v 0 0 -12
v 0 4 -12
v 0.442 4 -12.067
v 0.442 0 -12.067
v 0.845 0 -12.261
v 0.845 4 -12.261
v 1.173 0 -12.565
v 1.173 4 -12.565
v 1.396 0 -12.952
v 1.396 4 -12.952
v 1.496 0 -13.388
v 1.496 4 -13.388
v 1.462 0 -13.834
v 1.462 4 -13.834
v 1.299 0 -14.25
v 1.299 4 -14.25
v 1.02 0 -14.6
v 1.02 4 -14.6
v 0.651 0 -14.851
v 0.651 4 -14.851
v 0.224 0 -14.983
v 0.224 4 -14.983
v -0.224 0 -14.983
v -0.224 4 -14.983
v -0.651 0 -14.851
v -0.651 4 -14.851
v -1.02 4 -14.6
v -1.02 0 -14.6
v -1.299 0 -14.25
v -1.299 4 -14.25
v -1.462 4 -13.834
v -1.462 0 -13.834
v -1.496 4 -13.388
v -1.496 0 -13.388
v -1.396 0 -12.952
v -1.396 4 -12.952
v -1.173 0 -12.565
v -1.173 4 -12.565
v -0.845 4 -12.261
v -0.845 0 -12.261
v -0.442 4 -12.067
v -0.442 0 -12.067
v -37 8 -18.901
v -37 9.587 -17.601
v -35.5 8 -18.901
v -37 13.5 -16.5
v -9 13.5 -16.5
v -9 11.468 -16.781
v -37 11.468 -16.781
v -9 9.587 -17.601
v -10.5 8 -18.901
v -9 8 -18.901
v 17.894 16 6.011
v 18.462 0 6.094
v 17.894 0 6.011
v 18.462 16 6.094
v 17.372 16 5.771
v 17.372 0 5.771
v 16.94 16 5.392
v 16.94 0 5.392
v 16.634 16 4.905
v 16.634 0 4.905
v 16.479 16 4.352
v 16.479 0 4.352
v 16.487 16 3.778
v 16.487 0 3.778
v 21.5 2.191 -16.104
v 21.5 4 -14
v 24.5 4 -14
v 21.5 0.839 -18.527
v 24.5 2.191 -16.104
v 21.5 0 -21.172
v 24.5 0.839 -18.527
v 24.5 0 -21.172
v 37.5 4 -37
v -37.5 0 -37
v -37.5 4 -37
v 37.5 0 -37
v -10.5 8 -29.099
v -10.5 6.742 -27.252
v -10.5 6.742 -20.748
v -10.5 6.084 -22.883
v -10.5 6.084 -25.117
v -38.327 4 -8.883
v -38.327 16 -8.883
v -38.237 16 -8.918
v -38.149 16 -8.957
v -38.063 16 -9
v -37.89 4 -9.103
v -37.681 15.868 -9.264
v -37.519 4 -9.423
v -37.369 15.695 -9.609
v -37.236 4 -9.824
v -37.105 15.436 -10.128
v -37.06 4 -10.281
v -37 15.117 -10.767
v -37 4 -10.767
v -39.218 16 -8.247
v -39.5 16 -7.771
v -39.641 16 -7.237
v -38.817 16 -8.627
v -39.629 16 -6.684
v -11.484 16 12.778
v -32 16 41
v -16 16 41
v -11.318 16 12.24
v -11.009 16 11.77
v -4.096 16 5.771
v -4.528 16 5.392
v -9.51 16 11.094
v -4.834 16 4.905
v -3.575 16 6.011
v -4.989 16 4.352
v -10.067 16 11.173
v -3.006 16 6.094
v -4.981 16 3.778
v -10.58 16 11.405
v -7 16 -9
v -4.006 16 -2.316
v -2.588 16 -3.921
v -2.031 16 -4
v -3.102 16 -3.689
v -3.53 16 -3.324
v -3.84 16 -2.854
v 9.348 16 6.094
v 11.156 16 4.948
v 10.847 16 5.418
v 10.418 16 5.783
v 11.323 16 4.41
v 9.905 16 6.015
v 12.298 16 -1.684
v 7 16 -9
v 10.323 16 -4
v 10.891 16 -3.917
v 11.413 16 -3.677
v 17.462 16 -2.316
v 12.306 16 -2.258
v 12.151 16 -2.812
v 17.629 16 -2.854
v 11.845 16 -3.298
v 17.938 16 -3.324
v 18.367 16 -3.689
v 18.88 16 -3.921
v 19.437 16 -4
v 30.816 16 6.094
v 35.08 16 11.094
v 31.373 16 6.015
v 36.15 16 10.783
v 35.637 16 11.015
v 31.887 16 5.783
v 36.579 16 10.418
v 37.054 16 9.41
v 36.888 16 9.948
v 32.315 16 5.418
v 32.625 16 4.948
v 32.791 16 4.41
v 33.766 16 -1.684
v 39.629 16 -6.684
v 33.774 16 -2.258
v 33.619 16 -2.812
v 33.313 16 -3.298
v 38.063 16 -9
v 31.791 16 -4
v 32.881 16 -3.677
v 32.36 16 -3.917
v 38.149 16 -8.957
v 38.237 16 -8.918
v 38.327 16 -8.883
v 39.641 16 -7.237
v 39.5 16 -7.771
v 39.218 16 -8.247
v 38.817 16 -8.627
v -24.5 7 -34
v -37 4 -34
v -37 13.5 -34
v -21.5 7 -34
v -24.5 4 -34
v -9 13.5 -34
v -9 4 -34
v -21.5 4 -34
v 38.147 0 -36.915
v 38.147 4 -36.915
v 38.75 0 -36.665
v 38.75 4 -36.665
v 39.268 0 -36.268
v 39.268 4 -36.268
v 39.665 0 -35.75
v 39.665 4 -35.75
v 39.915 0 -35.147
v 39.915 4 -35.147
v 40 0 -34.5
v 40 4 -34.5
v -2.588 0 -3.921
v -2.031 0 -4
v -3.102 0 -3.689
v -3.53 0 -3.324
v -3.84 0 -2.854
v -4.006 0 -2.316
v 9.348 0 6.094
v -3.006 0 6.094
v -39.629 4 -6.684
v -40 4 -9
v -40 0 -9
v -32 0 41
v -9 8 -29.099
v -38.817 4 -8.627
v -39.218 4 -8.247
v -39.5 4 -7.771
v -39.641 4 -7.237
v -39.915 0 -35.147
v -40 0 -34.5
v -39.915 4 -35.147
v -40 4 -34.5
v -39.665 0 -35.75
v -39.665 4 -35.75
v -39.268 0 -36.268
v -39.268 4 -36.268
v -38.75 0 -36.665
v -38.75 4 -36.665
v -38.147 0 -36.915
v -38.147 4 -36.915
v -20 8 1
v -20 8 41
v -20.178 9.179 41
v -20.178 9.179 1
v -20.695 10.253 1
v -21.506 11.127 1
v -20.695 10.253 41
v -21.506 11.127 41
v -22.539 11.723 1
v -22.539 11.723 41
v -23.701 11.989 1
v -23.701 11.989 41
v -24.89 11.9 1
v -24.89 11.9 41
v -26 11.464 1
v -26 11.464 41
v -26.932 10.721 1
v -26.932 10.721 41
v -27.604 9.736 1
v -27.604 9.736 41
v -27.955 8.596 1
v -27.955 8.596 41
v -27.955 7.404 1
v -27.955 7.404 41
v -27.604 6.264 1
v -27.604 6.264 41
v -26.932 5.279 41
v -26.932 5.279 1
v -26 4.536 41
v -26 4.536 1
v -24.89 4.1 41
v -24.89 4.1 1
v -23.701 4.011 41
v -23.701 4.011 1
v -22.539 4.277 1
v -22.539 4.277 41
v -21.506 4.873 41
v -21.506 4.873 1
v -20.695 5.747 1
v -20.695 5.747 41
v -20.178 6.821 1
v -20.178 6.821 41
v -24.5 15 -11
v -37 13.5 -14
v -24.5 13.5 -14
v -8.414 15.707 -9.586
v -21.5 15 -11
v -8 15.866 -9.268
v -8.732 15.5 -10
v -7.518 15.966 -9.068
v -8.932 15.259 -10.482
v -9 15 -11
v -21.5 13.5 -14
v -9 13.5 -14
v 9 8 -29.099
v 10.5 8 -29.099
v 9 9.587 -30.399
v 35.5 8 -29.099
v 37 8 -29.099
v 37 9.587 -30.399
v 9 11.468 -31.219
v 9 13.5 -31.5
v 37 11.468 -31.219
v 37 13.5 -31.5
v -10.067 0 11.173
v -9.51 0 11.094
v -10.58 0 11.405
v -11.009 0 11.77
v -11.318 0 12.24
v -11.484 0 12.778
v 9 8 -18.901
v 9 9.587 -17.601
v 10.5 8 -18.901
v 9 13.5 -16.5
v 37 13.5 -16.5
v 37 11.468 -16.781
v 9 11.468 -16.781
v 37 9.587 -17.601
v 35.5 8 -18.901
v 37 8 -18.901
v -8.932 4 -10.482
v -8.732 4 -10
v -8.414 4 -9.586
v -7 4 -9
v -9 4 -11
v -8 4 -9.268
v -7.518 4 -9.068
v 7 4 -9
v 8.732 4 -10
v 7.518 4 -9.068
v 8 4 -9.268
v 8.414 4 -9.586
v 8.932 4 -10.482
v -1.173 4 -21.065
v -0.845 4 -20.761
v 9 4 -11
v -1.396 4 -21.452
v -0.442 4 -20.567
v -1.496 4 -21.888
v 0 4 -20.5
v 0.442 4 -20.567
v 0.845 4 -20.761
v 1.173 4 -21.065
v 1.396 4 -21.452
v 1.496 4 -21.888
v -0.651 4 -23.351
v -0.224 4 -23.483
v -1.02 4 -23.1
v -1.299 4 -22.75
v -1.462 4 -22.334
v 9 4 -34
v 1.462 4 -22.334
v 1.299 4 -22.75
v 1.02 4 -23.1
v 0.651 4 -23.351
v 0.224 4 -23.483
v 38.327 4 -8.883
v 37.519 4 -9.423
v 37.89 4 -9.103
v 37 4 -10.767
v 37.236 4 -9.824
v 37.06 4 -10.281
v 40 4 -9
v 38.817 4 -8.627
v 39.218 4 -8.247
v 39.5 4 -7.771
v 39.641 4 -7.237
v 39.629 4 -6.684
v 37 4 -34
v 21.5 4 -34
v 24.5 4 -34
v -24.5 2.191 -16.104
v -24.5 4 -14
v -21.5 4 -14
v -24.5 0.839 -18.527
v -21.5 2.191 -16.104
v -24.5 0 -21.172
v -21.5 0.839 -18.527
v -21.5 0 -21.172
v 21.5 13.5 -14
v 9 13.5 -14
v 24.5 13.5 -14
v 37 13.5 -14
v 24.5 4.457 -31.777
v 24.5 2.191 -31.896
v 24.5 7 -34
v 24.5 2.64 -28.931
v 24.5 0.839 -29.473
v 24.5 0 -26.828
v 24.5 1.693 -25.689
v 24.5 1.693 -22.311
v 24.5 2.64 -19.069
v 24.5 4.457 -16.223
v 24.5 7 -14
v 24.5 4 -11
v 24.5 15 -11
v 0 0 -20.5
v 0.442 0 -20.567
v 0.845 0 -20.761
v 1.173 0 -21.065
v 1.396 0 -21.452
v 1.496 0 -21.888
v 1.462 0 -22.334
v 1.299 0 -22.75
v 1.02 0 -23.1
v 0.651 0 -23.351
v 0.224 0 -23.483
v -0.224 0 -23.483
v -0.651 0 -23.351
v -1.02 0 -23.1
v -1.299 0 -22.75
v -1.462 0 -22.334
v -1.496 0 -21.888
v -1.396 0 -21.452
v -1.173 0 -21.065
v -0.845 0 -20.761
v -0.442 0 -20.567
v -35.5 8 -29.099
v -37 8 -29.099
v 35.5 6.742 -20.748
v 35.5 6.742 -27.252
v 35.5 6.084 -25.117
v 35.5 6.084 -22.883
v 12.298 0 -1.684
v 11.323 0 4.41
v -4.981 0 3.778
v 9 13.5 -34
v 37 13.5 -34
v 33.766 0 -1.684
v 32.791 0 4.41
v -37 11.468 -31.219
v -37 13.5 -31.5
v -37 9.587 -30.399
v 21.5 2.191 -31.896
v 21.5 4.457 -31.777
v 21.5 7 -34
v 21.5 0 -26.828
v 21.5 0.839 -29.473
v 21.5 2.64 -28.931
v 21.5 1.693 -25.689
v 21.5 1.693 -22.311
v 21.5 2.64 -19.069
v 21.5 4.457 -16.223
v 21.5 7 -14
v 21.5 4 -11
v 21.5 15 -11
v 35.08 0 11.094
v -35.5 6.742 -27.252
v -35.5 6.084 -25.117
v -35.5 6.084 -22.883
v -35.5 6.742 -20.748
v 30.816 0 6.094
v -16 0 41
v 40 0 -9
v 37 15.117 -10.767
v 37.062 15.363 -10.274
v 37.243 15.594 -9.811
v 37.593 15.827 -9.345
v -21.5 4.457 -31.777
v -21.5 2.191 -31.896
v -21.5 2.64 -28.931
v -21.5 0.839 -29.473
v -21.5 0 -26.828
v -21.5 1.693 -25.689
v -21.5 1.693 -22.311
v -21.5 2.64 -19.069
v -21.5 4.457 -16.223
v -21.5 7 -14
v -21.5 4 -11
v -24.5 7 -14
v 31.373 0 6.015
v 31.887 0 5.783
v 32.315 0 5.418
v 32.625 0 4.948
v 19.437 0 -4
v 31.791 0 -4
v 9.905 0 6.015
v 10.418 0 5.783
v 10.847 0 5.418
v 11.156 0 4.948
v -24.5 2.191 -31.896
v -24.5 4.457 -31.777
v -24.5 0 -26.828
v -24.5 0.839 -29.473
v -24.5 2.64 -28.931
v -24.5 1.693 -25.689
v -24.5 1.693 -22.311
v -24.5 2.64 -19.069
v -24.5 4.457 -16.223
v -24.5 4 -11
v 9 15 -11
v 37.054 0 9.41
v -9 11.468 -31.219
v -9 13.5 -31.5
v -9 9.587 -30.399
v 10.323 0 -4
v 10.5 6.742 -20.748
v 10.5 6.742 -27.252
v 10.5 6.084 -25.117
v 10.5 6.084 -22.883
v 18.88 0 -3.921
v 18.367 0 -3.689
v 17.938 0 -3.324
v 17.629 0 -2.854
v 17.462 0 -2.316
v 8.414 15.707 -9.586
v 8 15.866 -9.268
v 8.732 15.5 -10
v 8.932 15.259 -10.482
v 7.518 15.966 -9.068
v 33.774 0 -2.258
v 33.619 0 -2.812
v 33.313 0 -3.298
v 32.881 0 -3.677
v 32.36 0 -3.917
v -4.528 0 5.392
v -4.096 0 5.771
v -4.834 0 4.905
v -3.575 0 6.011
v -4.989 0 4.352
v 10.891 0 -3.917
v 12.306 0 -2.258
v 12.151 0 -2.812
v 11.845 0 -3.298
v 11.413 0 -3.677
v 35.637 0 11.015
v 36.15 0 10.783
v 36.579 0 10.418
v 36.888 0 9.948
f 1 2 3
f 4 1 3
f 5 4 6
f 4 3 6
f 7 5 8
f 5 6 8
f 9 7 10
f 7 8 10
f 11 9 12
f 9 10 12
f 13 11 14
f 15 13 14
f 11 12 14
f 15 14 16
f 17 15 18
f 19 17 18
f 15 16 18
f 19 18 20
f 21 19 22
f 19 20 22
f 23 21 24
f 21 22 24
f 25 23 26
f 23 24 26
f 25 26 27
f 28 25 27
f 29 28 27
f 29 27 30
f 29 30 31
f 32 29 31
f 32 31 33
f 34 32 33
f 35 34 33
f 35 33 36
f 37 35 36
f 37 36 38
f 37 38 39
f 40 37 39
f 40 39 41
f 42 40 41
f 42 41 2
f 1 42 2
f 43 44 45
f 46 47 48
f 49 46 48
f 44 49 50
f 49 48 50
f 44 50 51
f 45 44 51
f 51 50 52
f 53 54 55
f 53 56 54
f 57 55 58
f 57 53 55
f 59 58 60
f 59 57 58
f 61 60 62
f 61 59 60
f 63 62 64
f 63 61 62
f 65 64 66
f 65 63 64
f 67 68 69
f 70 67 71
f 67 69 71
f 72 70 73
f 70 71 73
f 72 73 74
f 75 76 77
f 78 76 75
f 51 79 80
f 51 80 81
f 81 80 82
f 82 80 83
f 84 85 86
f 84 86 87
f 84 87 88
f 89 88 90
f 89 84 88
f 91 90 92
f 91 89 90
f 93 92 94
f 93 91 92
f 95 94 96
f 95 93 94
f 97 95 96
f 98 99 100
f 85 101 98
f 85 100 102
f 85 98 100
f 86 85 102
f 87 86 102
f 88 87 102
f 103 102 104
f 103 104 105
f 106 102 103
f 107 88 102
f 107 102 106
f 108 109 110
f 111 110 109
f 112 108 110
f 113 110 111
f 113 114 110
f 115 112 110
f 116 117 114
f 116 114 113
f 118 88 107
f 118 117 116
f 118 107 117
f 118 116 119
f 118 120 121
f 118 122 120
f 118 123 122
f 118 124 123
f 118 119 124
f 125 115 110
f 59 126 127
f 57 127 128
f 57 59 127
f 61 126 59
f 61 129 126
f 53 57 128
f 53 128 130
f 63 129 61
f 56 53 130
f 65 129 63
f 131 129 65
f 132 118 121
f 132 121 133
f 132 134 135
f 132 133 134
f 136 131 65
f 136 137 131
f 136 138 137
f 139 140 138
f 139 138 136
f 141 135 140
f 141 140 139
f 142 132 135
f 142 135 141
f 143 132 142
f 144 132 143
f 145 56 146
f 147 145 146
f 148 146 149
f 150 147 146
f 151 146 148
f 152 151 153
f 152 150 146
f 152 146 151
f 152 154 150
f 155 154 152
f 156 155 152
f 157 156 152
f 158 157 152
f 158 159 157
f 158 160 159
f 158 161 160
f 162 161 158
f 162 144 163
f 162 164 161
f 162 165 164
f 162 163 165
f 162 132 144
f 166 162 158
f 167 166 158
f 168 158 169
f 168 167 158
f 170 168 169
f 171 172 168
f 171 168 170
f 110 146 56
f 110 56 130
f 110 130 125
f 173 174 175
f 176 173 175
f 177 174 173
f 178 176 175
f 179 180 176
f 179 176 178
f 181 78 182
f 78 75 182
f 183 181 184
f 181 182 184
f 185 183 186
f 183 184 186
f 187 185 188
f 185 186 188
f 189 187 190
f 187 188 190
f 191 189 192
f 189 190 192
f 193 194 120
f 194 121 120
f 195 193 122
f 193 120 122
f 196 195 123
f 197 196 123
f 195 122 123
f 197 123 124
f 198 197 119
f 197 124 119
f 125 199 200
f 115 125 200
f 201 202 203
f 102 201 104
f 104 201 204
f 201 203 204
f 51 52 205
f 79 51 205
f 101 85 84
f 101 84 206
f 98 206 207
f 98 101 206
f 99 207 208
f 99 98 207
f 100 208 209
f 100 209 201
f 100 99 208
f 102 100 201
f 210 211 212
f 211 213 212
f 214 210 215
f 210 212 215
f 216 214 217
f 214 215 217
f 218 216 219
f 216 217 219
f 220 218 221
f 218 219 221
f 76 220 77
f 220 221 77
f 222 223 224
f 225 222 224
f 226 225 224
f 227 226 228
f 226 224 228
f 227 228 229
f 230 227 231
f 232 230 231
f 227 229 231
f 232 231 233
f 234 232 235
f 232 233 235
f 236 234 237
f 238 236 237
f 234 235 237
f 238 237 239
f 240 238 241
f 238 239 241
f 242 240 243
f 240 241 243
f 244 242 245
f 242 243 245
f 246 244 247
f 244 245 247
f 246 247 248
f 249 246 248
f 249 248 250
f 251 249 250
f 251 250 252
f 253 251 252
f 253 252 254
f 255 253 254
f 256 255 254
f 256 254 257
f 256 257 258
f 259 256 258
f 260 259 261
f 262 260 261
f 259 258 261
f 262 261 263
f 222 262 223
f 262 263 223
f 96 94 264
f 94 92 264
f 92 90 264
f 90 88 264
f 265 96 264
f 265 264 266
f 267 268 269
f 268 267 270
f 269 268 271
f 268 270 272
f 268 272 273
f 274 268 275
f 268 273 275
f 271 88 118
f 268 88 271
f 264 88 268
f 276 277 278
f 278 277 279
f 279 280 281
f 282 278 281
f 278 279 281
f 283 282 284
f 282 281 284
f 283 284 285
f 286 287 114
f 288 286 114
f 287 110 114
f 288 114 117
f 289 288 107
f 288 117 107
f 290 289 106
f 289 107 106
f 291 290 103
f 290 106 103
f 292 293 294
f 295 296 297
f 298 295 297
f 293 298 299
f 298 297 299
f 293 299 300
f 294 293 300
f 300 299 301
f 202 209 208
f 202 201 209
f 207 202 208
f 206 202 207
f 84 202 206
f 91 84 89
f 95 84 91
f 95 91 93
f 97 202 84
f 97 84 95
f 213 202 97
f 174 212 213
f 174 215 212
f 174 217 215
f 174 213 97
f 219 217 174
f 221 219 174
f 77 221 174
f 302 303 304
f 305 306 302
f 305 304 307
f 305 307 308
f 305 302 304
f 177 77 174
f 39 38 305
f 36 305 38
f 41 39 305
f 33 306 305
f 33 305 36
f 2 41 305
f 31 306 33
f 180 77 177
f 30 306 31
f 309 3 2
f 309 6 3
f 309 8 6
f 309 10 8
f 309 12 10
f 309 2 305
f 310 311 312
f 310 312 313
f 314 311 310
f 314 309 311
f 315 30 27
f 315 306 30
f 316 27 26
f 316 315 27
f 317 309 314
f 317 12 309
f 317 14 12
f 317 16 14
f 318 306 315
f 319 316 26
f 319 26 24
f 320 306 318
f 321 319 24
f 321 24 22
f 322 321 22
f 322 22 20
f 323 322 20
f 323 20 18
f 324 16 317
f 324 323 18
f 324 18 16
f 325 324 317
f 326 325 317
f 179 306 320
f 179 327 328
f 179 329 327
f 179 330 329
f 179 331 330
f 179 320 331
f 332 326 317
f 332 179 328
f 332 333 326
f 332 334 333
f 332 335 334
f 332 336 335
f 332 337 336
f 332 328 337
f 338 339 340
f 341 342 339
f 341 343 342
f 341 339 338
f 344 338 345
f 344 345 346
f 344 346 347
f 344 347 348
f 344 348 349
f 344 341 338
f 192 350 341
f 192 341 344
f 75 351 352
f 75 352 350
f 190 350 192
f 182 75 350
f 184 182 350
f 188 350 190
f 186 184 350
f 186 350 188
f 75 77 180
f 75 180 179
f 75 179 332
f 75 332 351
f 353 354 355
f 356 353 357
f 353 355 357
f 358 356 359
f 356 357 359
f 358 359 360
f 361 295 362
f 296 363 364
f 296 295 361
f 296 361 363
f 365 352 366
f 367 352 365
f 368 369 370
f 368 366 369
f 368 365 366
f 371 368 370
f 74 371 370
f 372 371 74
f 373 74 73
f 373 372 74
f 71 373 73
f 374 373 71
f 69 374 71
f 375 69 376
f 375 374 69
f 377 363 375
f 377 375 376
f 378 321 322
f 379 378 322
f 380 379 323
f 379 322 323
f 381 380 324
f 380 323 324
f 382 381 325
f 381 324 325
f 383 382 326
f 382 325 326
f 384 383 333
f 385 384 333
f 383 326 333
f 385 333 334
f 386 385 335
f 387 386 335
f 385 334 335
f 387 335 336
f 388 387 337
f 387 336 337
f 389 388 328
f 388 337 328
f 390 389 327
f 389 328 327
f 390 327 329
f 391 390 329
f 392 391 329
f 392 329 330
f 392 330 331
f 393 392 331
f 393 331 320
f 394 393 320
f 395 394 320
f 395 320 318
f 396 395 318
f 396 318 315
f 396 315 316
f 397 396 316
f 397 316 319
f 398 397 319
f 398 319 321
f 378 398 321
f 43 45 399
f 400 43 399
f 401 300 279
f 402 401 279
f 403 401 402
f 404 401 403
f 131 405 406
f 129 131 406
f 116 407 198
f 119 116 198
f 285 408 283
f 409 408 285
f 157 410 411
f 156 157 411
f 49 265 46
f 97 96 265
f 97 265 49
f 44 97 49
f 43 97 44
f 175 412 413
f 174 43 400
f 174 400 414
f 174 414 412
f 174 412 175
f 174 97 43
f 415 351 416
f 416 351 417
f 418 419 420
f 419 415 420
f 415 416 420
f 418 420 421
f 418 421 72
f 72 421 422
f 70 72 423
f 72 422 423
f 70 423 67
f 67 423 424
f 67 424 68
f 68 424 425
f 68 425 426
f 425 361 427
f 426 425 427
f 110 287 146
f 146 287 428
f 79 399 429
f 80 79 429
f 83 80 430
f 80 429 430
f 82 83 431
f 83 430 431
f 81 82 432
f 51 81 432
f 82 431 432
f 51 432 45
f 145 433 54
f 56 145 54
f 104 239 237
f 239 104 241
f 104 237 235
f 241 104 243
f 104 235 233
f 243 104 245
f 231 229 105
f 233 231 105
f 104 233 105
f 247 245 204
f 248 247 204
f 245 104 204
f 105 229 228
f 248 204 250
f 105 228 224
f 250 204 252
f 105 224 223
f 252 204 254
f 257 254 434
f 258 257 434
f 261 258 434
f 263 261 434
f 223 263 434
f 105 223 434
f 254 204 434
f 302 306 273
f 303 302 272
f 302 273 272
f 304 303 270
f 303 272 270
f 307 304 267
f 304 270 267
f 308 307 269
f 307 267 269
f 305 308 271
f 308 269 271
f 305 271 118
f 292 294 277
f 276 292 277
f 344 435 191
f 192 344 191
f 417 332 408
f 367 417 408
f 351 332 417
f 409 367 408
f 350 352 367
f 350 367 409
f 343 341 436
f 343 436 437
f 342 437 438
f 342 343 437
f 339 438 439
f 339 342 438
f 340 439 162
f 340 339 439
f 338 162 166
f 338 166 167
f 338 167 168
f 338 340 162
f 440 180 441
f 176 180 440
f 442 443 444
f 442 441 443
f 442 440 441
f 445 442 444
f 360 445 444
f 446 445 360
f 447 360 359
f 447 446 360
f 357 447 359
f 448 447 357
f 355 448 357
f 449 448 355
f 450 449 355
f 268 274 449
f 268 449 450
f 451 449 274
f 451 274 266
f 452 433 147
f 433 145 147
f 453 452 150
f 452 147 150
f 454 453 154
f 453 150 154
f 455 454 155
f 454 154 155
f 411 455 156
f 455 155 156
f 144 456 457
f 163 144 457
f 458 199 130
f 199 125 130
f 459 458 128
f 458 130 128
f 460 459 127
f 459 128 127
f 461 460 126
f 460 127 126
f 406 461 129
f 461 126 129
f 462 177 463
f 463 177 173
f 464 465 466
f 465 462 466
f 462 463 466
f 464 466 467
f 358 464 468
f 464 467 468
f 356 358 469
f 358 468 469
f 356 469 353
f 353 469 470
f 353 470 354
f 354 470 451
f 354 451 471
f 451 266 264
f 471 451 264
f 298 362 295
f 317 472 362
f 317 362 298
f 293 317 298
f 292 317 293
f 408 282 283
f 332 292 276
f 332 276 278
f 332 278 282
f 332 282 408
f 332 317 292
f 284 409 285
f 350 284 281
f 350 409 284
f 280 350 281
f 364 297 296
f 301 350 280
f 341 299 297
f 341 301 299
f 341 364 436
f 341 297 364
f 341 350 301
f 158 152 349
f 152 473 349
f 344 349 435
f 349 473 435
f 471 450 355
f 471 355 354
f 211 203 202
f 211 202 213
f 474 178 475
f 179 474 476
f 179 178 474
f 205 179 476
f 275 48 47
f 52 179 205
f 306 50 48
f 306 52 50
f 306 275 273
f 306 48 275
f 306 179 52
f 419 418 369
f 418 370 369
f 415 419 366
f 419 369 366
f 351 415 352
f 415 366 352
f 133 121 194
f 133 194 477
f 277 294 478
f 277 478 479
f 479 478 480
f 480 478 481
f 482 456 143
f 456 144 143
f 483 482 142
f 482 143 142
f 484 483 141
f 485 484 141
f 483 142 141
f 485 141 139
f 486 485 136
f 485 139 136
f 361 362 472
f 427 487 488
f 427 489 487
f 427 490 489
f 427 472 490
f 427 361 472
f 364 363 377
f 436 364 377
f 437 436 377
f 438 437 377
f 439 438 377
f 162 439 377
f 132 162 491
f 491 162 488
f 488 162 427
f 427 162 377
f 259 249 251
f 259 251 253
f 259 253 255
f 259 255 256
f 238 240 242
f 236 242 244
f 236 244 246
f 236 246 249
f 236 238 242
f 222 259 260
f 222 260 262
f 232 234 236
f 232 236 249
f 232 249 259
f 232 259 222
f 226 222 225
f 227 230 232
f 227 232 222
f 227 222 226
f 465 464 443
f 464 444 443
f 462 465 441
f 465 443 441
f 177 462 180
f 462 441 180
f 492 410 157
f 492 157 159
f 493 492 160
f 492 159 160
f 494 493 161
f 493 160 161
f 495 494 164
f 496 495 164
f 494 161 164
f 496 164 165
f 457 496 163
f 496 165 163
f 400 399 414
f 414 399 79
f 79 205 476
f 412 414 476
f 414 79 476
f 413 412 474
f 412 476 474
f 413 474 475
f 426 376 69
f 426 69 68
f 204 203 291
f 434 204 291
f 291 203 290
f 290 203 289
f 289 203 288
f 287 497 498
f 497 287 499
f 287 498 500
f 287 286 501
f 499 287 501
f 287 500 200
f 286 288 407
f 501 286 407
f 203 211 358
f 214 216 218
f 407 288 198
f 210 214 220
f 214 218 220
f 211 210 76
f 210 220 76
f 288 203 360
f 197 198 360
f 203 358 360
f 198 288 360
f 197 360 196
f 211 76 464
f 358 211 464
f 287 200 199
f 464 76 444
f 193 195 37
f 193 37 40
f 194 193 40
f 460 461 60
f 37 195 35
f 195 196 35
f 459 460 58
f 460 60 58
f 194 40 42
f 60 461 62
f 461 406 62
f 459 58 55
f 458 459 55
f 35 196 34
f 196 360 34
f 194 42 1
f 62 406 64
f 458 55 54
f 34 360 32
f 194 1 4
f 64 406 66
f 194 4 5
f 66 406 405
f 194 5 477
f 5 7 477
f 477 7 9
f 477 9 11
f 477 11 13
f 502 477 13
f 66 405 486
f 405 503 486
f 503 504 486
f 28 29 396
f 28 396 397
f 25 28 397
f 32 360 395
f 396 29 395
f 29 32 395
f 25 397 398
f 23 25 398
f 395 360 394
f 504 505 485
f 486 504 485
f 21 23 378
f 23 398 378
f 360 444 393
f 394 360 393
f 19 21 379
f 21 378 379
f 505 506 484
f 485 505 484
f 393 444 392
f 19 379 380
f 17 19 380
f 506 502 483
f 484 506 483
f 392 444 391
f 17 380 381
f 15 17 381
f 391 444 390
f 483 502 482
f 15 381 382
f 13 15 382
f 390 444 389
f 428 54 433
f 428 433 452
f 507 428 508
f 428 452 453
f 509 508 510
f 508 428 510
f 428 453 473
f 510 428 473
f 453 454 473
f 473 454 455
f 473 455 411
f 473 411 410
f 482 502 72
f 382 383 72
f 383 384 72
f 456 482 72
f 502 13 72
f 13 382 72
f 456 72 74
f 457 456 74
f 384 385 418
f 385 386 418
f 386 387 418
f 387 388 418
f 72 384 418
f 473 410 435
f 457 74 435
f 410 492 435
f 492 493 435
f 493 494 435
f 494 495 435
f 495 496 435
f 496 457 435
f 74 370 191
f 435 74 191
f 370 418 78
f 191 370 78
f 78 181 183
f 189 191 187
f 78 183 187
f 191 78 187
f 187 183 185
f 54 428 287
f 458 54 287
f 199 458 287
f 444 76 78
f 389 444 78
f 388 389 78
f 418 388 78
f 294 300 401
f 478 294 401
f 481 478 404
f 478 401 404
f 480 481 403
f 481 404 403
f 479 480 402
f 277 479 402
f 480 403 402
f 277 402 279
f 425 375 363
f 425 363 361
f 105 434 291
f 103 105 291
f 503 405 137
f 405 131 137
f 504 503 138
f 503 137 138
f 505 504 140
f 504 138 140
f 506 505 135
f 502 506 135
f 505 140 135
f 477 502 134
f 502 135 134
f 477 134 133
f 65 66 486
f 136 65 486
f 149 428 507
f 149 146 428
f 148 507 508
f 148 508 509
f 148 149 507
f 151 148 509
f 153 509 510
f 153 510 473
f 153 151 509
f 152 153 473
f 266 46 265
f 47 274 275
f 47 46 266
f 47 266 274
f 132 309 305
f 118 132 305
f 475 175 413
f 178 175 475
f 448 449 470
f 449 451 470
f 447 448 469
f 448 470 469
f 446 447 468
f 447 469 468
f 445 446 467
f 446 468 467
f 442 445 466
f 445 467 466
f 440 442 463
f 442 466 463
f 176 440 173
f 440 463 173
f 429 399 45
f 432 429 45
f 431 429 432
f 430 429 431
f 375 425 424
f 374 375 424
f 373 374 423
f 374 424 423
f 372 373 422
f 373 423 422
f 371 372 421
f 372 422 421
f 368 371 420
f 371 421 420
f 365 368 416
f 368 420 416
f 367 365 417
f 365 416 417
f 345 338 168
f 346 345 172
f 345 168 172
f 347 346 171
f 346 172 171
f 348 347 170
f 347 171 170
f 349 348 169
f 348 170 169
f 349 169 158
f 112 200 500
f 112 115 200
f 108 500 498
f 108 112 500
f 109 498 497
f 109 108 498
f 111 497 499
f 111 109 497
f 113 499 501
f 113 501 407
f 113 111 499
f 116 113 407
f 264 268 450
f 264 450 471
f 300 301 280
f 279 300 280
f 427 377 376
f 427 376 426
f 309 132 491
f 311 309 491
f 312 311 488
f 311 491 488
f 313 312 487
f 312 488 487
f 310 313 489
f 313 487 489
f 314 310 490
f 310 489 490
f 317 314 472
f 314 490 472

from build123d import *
from build123d.topology import SkipClean

# Parameters (mm, degrees)
SKETCH7_W       = 80
SKETCH7_H       = 28
EXTRUDE2_DEPTH  = 4
SKETCH8_W       = 28
SKETCH8_H       = 20
EXTRUDE3_DEPTH  = 9.5
EXTRUDE6_DEPTH  = 28
SKETCH15_R      = 7.5
EXTRUDE7_DEPTH  = 25
SKETCH16_W      = 3
SKETCH16_H      = 3
SKETCH8_4_W     = 28
SKETCH8_4_H     = 20
EXTRUDE8_DEPTH  = 9.5
EXTRUDE9_DEPTH  = 28
SKETCH19_R      = 7.5
EXTRUDE10_DEPTH = 25
SKETCH20_W      = 3
SKETCH20_H      = 3
FILLET1_R       = 2.5
EXTRUDE11_DEPTH = 16
SKETCH25_W      = 28
SKETCH25_H      = 5
EXTRUDE13_DEPTH = 12
EXTRUDE14_REACH = 90.69
FILLET11_R      = 2
SKETCH27_W      = 28
SKETCH27_H      = 5
EXTRUDE15_DEPTH = 12
EXTRUDE16_REACH = 90.69
FILLET14_R      = 2
SKETCH30_W      = 3
SKETCH30_H      = 3
EXTRUDE17_DEPTH = 12
SKETCH31_W      = 3
SKETCH31_H      = 3
EXTRUDE18_DEPTH = 12
SKETCH32_R      = 4
EXTRUDE19_DEPTH = 40
FILLET15_R      = 2
FILLET16_R      = 2
FILLET17_R      = 2
FILLET18_R      = 2
FILLET19_R      = 2
FILLET20_R      = 2
FILLET21_R      = 2
SKETCH33_R      = 1.5
EXTRUDE20_DEPTH = 59.523499692


with BuildPart() as part:
    # Sketch7 → Extrude2 (new body)
    with BuildSketch(Plane(origin=(0, 0, 0), x_dir=(1, 0, 0), z_dir=(0, 1, 0))):
        with Locations((0, 23)):
            Rectangle(SKETCH7_W, SKETCH7_H)
    extrude(amount=EXTRUDE2_DEPTH)


with BuildPart() as body_2:
    # Sketch8 → Extrude3 (new body)
    with BuildSketch(Plane(origin=(0, 4, 0), x_dir=(1, 0, 0), z_dir=(0, 1, 0))):
        with Locations((-23, 24)):
            Rectangle(SKETCH8_W, SKETCH8_H)
    extrude(amount=EXTRUDE3_DEPTH)

    # Sketch10 → Extrude6 (cut)
    with BuildSketch(Plane(origin=(-9, 0, 0), x_dir=(0, 0, -1), z_dir=(1, 0, 0))):
        with BuildLine():
            Line((31.5, 13.5), (24, 13.5))
            Line((24, 13.5), (16.5, 13.5))
            ThreePointArc((16.5, 13.5), (17.126403912, 10.499387259), (18.900980486, 8))
            Line((18.900980486, 8), (29.099019514, 8))
            ThreePointArc((29.099019514, 8), (30.873596088, 10.499387259), (31.5, 13.5))
        make_face()
    extrude(amount=-EXTRUDE6_DEPTH, mode=Mode.SUBTRACT)

    # Sketch15 → Extrude7 (cut)
    with SkipClean():  # the faces are left unmerged after this step: merging them gives an invalid solid
        with BuildSketch(Plane.ZY.offset(35.5)):
            with Locations((-24, 13.5)):
                Circle(SKETCH15_R)
        extrude(amount=-EXTRUDE7_DEPTH, mode=Mode.SUBTRACT)


with BuildPart() as cut_sweep1_tool:
    # Cut-Sweep1: sweep along a path in Sketch17
    with SkipClean():  # the faces are left unmerged after this step: merging them gives an invalid solid
        with BuildLine(Plane(origin=(-23, 0, 0), x_dir=(0, 0, -1), z_dir=(1, 0, 0))) as cut_sweep1_path:
            CenterArc((24, 13.5), 12.806248475, 0, 360)
        # Sketch16 → Cut-Sweep1 (sweep)
        with BuildSketch(Plane.XY.offset(-14)):
            with Locations((-23, 5.5)):
                Rectangle(SKETCH16_W, SKETCH16_H)
        sweep(path=cut_sweep1_path.line)


with BuildPart() as part_1:
    with SkipClean():  # the faces are left unmerged after this step: merging them gives an invalid solid
        add(part.part)

        # Cut-Sweep1: cut by cut_sweep1_tool
        add(cut_sweep1_tool.part, mode=Mode.SUBTRACT)

    # Sketch8<4> → Extrude8 (add)
    with BuildSketch(Plane(origin=(0, 4, 0), x_dir=(1, 0, 0), z_dir=(0, 1, 0))):
        with Locations((23, 24)):
            Rectangle(SKETCH8_4_W, SKETCH8_4_H)
    extrude(amount=EXTRUDE8_DEPTH)

    # Sketch18 → Extrude9 (cut)
    with BuildSketch(Plane(origin=(37, 0, 0), x_dir=(0, 0, -1), z_dir=(1, 0, 0))):
        with BuildLine():
            Line((18.900980486, 8), (29.099019514, 8))
            ThreePointArc((29.099019514, 8), (30.873596088, 10.499387259), (31.5, 13.5))
            Line((31.5, 13.5), (16.5, 13.5))
            ThreePointArc((16.5, 13.5), (17.126403912, 10.499387259), (18.900980486, 8))
        make_face()
    extrude(amount=-EXTRUDE9_DEPTH, mode=Mode.SUBTRACT)

    # Sketch19 → Extrude10 (cut)
    with BuildSketch(Plane(origin=(35.5, 0, 0), x_dir=(0, 0, -1), z_dir=(1, 0, 0))):
        with Locations((24, 13.5)):
            Circle(SKETCH19_R)
    extrude(amount=-EXTRUDE10_DEPTH, mode=Mode.SUBTRACT)

    # Cut-Sweep2: sweep along a path in Sketch21
    with BuildLine(Plane(origin=(23, 0, 0), x_dir=(0, 0, -1), z_dir=(1, 0, 0))) as cut_sweep2_path:
        CenterArc((24, 13.5), 12.806248475, 0, 360)
    # Sketch20 → Cut-Sweep2 (sweep, cut)
    with BuildSketch(Plane.XY.offset(-14)):
        with Locations((23, 5.5)):
            Rectangle(SKETCH20_W, SKETCH20_H)
    sweep(path=cut_sweep2_path.line, mode=Mode.SUBTRACT)

    # Fillet1
    fillet1_edges = [part_1.edges().sort_by_distance(p)[0] for p in [
        (-40, 2, -37),
        (40, 2, -37),
    ]]
    fillet(fillet1_edges, radius=FILLET1_R)

    # Sketch22 → Extrude11 (add)
    with BuildSketch(Plane(origin=(0, 0, 0), x_dir=(1, 0, 0), z_dir=(0, 1, 0))):
        Polygon((36.784969303, -11.093941854), (40, 9), (-40, 9), (-32, -41), (-16, -41), (-11.215030697, -11.093941854), align=None)
        Polygon((12.66820222, 4), (11.053171523, -6.093941854), (-5.351435136, -6.093941854), (-3.73640444, 4), align=None, mode=Mode.SUBTRACT)
        Polygon((17.73179778, 4), (34.13640444, 4), (32.521373743, -6.093941854), (16.116767084, -6.093941854), align=None, mode=Mode.SUBTRACT)
    extrude(amount=EXTRUDE11_DEPTH)



with BuildPart() as body_2_1:
    with SkipClean():  # the faces are left unmerged after this step: merging them gives an invalid solid
        add(body_2.part)

        # Cut-Sweep1: cut by cut_sweep1_tool
        add(cut_sweep1_tool.part, mode=Mode.SUBTRACT)


with BuildPart() as part_2:
    with SkipClean():  # the faces are left unmerged after this step: merging them gives an invalid solid
        add(part_1.part)

        add(body_2_1.part)  # Extrude13 merges body 2
        # Sketch25 → Extrude13 (add)
        with BuildSketch(Plane(origin=(0, 4, 0), x_dir=(-1, 0, 0), z_dir=(0, 1, 0))):
            with Locations((23, -11.5)):
                Rectangle(SKETCH25_W, SKETCH25_H)
        extrude(amount=EXTRUDE13_DEPTH)

    # Sketch26 → Extrude14 (cut, up to next)
    with BuildSketch(Plane.ZY.offset(37), mode=Mode.PRIVATE) as extrude14_sk1:
        Polygon((-14, 13.5), (-9, 16), (-14, 16), align=None)
    extrude14_tool1 = extrude(extrude14_sk1.sketch, amount=-EXTRUDE14_REACH, mode=Mode.PRIVATE) & part_2.part
    add(extrude14_tool1.solids().sort_by_distance((-37, 15.166667, -12.333333))[0], mode=Mode.SUBTRACT)

    # Fillet11
    fillet11_edges = [part_2.edges().sort_by_distance(p)[0] for p in [
        (-9, 10, -9),
    ]]
    fillet(fillet11_edges, radius=FILLET11_R)

    # Sketch27 → Extrude15 (add)
    with SkipClean():  # the faces are left unmerged after this step: merging them gives an invalid solid
        with BuildSketch(Plane(origin=(0, 4, 0), x_dir=(-1, 0, 0), z_dir=(0, 1, 0))):
            with Locations((-23, -11.5)):
                Rectangle(SKETCH27_W, SKETCH27_H)
        extrude(amount=EXTRUDE15_DEPTH)

    # Sketch28 → Extrude16 (cut, up to next)
    with BuildSketch(Plane(origin=(37, 0, 0), x_dir=(0, 0, -1), z_dir=(1, 0, 0)), mode=Mode.PRIVATE) as extrude16_sk1:
        Polygon((14, 13.5), (9, 16), (14, 16), align=None)
    extrude16_tool1 = extrude(extrude16_sk1.sketch, amount=-EXTRUDE16_REACH, mode=Mode.PRIVATE) & part_2.part
    add(extrude16_tool1.solids().sort_by_distance((37, 15.166667, -12.333333))[0], mode=Mode.SUBTRACT)

    # Fillet14
    fillet14_edges = [part_2.edges().sort_by_distance(p)[0] for p in [
        (9, 10, -9),
    ]]
    fillet(fillet14_edges, radius=FILLET14_R)

    # Sketch30 → Extrude17 (cut)
    with SkipClean():  # the faces are left unmerged after this step: merging them gives an invalid solid
        with BuildSketch(Plane(origin=(0, 16, 0), x_dir=(-1, 0, 0), z_dir=(0, 1, 0))):
            with Locations((-23, -12.5)):
                Rectangle(SKETCH30_W, SKETCH30_H)
        extrude(amount=-EXTRUDE17_DEPTH, mode=Mode.SUBTRACT)

    # Sketch31 → Extrude18 (cut)
    with SkipClean():  # the faces are left unmerged after this step: merging them gives an invalid solid
        with BuildSketch(Plane(origin=(0, 16, 0), x_dir=(-1, 0, 0), z_dir=(0, 1, 0))):
            with Locations((23, -12.5)):
                Rectangle(SKETCH31_W, SKETCH31_H)
        extrude(amount=-EXTRUDE18_DEPTH, mode=Mode.SUBTRACT)

    # Sketch32 → Extrude19 (cut)
    with SkipClean():  # the faces are left unmerged after this step: merging them gives an invalid solid
        with BuildSketch(Plane.XY.offset(41)):
            with Locations((-24, 8)):
                Circle(SKETCH32_R)
        extrude(amount=-EXTRUDE19_DEPTH, mode=Mode.SUBTRACT)

    # Fillet15
    fillet15_edges = [part_2.edges().sort_by_distance(p)[0] for p in [
        (-40, 10, -9),
    ]]
    fillet(fillet15_edges, radius=FILLET15_R)

    # Fillet16
    # the kernel refuses this fillet: 2 mm, written as the material it adds along each edge
    with BuildSketch(Plane(origin=(-37, -0.417336402, -9), x_dir=(0, 0, -1), z_dir=(0, 1, 0))) as fillet16_piece_1_section:
        with BuildLine():
            CenterArc((1.766934561, 2), FILLET16_R, 199.655233066, 70.344766934)
            Line((-0.11653272, 1.327280888), (-0.304879448, 1.260008977))
            ThreePointArc((-0.304879448, 1.260008977), (-0.2, 0.654561776), (-0.2, 0))
            Line((-0.2, 0), (0, -0.2))
            Line((0, -0.2), (1.766934561, -0.2))
            Line((1.766934561, -0.2), (1.766934561, 0))
        make_face()
    fillet16_piece_1 = extrude(amount=16.417336402, mode=Mode.PRIVATE)
    fillet16_piece_1 = split(fillet16_piece_1, bisect_by=Plane(origin=(-37.361885023, 0, -9.612553635), z_dir=(0, 1, 0)), keep=Keep.TOP, mode=Mode.PRIVATE)
    fillet16_piece_1 = split(fillet16_piece_1, bisect_by=Plane(origin=(-37.361885023, 14.554978546, -11.890042908), z_dir=(0, -0.8944271909999159, 0.44721359549995804)), keep=Keep.TOP, mode=Mode.PRIVATE)
    add(fillet16_piece_1)

    # Fillet17
    fillet17_edges = [part_2.edges().sort_by_distance(p)[0] for p in [
        (40, 10, -9),
    ]]
    fillet(fillet17_edges, radius=FILLET17_R)

    # Fillet18
    # the kernel refuses this fillet: 2 mm, written as the material it adds along each edge
    with BuildSketch(Plane(origin=(37, -0.417336402, -9), x_dir=(0.9961678888786428, 0, 0.08746163254289245), z_dir=(0, 1, 0))) as fillet18_piece_1_section:
        with BuildLine():
            CenterArc((1.837796796, 1.935086736), FILLET18_R, 185.017593378, 70.344766934)
            Line((-0.154538981, 1.760163471), (-0.353772559, 1.742671145))
            Line((-0.353772559, 1.742671145), (-0.199233578, -0.017492327))
            Line((-0.199233578, -0.017492327), (0.017492327, -0.199233578))
            ThreePointArc((0.017492327, -0.199233578), (0.669545749, -0.141984536), (1.281845737, -0.193508674))
            Line((1.281845737, -0.193508674), (1.332386742, 0))
        make_face()
    fillet18_piece_1 = extrude(amount=16.417336402, mode=Mode.PRIVATE)
    fillet18_piece_1 = split(fillet18_piece_1, bisect_by=Plane(origin=(37.361885023, 14.554978546, -11.890042908), z_dir=(0, -0.8944271909999157, 0.4472135954999582)), keep=Keep.TOP, mode=Mode.PRIVATE)
    fillet18_piece_1 = split(fillet18_piece_1, bisect_by=Plane(origin=(37.361885023, 0, -9.612553635), z_dir=(0, 1, 0)), keep=Keep.TOP, mode=Mode.PRIVATE)
    add(fillet18_piece_1)

    # Fillet19
    fillet19_edges = [part_2.edges().sort_by_distance(p)[0] for p in [
        (11.053171523, 8, 6.093941854),
        (32.521373743, 8, 6.093941854),
    ]]
    fillet(fillet19_edges, radius=FILLET19_R)

    # Fillet20
    fillet20_edges = [part_2.edges().sort_by_distance(p)[0] for p in [
        (36.784969303, 8, 11.093941854),
        (-3.73640444, 8, -4),
        (-5.351435136, 8, 6.093941854),
        (12.66820222, 8, -4),
        (34.13640444, 8, -4),
        (17.73179778, 8, -4),
        (16.116767084, 8, 6.093941854),
    ]]
    fillet(fillet20_edges, radius=FILLET20_R)

    # Fillet21
    fillet21_edges = [part_2.edges().sort_by_distance(p)[0] for p in [
        (-11.215030697, 8, 11.093941854),
    ]]
    fillet(fillet21_edges, radius=FILLET21_R)

    # Sketch33 → Extrude20 (cut, through all)
    with BuildSketch(Plane(origin=(0, 4, 0), x_dir=(-1, 0, 0), z_dir=(0, 1, 0))):
        with Locations(Location((0, -13.5, 0), (0, 0, 90))):
            Circle(SKETCH33_R)
        with Locations(Location((0, -22, 0), (0, 0, 90))):
            Circle(SKETCH33_R)
    extrude(amount=-EXTRUDE20_DEPTH, mode=Mode.SUBTRACT)


solid = part_2.part
